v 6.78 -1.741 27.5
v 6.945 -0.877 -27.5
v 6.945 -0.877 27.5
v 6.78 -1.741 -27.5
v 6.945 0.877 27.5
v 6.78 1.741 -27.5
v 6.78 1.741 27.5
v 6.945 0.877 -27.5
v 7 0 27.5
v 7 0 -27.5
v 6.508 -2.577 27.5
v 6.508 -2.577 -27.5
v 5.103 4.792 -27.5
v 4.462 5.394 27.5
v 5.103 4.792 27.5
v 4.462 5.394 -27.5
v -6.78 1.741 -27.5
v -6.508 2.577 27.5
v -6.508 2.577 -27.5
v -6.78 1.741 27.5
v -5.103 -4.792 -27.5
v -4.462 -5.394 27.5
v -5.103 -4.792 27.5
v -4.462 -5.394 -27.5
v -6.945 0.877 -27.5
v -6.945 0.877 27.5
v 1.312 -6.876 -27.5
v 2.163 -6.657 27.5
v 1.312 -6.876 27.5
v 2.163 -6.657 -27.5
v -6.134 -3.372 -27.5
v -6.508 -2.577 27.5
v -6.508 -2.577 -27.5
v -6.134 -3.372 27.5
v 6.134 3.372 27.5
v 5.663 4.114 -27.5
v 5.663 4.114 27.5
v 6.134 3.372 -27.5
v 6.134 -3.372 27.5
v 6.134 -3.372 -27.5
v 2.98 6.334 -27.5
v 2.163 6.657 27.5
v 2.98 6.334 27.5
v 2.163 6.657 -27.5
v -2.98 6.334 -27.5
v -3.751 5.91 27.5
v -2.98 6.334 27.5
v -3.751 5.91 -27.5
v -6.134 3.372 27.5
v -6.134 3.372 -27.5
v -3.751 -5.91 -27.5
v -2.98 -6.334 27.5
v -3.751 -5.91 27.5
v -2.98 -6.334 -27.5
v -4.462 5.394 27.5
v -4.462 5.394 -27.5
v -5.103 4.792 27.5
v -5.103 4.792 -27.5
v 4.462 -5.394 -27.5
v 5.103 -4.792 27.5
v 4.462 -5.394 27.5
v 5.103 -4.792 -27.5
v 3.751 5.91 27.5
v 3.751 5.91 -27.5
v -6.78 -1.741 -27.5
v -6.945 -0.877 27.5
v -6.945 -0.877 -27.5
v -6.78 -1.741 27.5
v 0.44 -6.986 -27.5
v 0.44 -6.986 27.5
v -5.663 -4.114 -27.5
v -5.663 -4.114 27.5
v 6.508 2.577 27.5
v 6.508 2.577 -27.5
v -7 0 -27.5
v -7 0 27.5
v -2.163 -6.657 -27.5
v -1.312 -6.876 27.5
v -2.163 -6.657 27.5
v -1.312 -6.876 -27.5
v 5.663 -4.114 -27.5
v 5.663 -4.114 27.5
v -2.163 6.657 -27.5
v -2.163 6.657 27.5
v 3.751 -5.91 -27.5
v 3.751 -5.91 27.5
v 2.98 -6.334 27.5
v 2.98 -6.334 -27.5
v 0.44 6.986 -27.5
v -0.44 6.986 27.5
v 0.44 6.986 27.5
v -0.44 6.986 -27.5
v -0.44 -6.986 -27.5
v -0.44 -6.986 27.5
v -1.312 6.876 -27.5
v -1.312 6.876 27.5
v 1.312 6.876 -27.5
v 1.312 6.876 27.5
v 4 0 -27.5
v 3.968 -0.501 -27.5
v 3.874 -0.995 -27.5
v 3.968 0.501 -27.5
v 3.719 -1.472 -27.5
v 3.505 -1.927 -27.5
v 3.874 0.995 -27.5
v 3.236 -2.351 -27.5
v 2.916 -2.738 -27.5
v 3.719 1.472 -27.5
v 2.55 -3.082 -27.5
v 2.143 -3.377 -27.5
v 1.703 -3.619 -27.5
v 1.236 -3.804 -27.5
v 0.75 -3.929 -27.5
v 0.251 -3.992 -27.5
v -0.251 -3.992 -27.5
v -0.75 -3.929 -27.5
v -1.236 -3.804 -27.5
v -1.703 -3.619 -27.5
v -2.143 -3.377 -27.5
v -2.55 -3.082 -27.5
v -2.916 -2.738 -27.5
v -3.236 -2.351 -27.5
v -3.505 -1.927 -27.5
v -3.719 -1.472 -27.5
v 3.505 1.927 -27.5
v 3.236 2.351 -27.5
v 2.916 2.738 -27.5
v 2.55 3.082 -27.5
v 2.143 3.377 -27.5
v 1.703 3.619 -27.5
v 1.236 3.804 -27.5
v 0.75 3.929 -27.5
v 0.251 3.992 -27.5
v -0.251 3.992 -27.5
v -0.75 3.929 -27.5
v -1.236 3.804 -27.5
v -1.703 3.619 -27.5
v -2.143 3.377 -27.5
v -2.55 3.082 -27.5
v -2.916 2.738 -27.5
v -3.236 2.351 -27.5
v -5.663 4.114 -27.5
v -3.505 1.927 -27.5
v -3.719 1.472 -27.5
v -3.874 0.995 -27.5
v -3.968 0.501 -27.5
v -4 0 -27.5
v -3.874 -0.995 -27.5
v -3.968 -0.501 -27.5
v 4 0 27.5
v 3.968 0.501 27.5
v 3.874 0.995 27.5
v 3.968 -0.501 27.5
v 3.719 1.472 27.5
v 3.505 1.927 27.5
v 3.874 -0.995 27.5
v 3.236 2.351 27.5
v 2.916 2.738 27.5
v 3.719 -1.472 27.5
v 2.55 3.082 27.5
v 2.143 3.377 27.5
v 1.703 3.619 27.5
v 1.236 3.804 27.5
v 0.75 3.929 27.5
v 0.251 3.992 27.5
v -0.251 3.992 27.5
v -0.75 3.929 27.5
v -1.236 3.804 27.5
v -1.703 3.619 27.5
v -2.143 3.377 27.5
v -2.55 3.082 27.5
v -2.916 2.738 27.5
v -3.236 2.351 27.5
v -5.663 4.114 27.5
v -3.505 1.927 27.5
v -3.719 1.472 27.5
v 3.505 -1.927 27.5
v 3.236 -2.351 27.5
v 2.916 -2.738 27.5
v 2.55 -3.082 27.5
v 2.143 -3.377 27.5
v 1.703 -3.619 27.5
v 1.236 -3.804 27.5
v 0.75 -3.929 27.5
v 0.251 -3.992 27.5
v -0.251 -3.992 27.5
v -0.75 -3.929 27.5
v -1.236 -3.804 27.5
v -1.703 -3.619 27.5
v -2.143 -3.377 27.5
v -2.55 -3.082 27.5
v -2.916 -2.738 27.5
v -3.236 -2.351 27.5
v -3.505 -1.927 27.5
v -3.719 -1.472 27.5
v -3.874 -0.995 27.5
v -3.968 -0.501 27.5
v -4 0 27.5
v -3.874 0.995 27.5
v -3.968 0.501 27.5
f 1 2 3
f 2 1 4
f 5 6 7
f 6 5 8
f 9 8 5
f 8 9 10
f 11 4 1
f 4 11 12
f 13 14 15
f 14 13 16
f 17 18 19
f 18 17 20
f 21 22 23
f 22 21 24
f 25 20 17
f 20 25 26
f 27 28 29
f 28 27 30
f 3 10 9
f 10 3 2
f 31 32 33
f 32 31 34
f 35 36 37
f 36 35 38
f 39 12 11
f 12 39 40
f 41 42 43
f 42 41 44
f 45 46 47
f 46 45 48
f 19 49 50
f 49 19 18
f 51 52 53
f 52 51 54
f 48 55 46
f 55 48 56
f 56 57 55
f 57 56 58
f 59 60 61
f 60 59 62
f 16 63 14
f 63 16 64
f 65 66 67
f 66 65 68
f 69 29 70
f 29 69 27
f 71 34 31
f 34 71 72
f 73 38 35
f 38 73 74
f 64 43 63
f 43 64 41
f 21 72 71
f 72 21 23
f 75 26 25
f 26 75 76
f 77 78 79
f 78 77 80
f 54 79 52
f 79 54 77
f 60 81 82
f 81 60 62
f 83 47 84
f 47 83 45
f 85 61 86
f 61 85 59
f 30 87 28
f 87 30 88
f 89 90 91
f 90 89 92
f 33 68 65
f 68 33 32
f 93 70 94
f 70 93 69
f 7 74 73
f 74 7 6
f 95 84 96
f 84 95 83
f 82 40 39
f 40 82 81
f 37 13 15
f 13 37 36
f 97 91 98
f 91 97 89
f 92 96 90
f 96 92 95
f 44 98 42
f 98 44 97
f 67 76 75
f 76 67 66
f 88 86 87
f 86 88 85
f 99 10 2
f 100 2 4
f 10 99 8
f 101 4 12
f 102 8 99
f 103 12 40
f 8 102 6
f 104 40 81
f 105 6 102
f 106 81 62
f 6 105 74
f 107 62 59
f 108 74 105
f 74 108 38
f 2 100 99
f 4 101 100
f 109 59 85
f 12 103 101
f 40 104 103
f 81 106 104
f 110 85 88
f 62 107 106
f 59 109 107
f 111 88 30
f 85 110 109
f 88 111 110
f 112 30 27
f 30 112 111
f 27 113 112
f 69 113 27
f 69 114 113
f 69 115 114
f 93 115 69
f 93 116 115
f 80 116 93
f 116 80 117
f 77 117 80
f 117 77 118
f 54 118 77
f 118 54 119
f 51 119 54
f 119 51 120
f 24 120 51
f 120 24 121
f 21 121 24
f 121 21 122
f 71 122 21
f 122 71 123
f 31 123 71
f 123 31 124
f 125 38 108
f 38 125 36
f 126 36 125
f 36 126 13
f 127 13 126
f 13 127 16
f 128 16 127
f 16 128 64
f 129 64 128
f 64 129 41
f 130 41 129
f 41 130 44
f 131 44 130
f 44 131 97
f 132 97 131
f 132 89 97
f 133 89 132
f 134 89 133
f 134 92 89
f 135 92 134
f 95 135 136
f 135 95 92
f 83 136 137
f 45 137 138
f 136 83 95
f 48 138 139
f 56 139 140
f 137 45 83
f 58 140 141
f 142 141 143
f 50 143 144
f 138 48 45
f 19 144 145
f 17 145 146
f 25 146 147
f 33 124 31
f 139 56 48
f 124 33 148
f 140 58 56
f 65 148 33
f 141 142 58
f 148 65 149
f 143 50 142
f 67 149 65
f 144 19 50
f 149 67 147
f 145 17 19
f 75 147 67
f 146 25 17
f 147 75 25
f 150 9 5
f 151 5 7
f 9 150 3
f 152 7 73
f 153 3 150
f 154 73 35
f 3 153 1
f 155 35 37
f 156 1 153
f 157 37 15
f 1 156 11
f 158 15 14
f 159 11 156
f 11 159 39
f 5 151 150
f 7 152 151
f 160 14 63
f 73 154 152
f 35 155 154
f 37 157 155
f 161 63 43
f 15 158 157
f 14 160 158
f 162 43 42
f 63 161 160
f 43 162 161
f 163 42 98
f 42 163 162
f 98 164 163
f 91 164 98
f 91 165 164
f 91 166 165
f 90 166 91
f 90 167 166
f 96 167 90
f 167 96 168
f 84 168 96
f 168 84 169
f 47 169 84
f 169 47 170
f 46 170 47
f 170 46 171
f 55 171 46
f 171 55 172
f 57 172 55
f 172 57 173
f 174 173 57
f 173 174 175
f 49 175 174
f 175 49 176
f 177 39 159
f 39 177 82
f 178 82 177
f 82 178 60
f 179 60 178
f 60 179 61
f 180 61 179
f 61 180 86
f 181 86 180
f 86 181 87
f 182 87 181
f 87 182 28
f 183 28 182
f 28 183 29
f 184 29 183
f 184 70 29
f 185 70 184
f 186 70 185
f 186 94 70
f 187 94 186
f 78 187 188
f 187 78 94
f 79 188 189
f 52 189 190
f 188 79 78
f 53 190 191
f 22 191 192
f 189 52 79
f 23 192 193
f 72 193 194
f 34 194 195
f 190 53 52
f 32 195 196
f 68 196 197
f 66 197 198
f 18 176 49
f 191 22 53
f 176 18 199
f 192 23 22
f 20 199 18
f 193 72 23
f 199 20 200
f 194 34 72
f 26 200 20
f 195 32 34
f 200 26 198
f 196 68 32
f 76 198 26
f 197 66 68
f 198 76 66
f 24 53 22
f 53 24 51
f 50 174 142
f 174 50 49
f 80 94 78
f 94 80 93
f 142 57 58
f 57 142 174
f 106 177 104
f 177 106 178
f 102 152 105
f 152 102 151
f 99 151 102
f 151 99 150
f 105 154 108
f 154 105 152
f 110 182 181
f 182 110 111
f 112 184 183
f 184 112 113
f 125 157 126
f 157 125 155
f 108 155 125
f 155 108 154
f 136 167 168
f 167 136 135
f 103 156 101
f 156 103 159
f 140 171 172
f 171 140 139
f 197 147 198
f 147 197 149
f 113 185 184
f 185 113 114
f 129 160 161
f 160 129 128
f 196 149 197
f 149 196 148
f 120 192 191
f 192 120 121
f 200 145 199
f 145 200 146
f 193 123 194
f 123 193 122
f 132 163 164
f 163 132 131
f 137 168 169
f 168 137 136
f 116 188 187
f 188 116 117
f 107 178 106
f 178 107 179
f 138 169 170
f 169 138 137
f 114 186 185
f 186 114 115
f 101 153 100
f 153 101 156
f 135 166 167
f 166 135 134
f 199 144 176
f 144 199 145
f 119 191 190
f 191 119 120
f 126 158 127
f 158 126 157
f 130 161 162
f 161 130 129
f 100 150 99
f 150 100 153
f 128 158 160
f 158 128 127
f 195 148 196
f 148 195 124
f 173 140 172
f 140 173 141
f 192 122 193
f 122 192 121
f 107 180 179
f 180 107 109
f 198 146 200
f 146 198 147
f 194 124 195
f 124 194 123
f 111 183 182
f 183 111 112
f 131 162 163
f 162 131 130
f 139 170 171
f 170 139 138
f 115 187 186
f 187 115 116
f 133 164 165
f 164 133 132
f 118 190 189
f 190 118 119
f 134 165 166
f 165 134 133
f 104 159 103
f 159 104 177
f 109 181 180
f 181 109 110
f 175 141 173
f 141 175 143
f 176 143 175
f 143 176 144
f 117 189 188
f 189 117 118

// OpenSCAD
$fn = 50;


difference() {
	union() {
		translate(v = [0, 0, -27.5000000000]) {
			cylinder(h = 55, r = 7.0000000000);
		}
	}
	union() {
		translate(v = [0, 0, -100.0000000000]) {
			cylinder(h = 200, r = 4.0000000000);
		}
	}
}
